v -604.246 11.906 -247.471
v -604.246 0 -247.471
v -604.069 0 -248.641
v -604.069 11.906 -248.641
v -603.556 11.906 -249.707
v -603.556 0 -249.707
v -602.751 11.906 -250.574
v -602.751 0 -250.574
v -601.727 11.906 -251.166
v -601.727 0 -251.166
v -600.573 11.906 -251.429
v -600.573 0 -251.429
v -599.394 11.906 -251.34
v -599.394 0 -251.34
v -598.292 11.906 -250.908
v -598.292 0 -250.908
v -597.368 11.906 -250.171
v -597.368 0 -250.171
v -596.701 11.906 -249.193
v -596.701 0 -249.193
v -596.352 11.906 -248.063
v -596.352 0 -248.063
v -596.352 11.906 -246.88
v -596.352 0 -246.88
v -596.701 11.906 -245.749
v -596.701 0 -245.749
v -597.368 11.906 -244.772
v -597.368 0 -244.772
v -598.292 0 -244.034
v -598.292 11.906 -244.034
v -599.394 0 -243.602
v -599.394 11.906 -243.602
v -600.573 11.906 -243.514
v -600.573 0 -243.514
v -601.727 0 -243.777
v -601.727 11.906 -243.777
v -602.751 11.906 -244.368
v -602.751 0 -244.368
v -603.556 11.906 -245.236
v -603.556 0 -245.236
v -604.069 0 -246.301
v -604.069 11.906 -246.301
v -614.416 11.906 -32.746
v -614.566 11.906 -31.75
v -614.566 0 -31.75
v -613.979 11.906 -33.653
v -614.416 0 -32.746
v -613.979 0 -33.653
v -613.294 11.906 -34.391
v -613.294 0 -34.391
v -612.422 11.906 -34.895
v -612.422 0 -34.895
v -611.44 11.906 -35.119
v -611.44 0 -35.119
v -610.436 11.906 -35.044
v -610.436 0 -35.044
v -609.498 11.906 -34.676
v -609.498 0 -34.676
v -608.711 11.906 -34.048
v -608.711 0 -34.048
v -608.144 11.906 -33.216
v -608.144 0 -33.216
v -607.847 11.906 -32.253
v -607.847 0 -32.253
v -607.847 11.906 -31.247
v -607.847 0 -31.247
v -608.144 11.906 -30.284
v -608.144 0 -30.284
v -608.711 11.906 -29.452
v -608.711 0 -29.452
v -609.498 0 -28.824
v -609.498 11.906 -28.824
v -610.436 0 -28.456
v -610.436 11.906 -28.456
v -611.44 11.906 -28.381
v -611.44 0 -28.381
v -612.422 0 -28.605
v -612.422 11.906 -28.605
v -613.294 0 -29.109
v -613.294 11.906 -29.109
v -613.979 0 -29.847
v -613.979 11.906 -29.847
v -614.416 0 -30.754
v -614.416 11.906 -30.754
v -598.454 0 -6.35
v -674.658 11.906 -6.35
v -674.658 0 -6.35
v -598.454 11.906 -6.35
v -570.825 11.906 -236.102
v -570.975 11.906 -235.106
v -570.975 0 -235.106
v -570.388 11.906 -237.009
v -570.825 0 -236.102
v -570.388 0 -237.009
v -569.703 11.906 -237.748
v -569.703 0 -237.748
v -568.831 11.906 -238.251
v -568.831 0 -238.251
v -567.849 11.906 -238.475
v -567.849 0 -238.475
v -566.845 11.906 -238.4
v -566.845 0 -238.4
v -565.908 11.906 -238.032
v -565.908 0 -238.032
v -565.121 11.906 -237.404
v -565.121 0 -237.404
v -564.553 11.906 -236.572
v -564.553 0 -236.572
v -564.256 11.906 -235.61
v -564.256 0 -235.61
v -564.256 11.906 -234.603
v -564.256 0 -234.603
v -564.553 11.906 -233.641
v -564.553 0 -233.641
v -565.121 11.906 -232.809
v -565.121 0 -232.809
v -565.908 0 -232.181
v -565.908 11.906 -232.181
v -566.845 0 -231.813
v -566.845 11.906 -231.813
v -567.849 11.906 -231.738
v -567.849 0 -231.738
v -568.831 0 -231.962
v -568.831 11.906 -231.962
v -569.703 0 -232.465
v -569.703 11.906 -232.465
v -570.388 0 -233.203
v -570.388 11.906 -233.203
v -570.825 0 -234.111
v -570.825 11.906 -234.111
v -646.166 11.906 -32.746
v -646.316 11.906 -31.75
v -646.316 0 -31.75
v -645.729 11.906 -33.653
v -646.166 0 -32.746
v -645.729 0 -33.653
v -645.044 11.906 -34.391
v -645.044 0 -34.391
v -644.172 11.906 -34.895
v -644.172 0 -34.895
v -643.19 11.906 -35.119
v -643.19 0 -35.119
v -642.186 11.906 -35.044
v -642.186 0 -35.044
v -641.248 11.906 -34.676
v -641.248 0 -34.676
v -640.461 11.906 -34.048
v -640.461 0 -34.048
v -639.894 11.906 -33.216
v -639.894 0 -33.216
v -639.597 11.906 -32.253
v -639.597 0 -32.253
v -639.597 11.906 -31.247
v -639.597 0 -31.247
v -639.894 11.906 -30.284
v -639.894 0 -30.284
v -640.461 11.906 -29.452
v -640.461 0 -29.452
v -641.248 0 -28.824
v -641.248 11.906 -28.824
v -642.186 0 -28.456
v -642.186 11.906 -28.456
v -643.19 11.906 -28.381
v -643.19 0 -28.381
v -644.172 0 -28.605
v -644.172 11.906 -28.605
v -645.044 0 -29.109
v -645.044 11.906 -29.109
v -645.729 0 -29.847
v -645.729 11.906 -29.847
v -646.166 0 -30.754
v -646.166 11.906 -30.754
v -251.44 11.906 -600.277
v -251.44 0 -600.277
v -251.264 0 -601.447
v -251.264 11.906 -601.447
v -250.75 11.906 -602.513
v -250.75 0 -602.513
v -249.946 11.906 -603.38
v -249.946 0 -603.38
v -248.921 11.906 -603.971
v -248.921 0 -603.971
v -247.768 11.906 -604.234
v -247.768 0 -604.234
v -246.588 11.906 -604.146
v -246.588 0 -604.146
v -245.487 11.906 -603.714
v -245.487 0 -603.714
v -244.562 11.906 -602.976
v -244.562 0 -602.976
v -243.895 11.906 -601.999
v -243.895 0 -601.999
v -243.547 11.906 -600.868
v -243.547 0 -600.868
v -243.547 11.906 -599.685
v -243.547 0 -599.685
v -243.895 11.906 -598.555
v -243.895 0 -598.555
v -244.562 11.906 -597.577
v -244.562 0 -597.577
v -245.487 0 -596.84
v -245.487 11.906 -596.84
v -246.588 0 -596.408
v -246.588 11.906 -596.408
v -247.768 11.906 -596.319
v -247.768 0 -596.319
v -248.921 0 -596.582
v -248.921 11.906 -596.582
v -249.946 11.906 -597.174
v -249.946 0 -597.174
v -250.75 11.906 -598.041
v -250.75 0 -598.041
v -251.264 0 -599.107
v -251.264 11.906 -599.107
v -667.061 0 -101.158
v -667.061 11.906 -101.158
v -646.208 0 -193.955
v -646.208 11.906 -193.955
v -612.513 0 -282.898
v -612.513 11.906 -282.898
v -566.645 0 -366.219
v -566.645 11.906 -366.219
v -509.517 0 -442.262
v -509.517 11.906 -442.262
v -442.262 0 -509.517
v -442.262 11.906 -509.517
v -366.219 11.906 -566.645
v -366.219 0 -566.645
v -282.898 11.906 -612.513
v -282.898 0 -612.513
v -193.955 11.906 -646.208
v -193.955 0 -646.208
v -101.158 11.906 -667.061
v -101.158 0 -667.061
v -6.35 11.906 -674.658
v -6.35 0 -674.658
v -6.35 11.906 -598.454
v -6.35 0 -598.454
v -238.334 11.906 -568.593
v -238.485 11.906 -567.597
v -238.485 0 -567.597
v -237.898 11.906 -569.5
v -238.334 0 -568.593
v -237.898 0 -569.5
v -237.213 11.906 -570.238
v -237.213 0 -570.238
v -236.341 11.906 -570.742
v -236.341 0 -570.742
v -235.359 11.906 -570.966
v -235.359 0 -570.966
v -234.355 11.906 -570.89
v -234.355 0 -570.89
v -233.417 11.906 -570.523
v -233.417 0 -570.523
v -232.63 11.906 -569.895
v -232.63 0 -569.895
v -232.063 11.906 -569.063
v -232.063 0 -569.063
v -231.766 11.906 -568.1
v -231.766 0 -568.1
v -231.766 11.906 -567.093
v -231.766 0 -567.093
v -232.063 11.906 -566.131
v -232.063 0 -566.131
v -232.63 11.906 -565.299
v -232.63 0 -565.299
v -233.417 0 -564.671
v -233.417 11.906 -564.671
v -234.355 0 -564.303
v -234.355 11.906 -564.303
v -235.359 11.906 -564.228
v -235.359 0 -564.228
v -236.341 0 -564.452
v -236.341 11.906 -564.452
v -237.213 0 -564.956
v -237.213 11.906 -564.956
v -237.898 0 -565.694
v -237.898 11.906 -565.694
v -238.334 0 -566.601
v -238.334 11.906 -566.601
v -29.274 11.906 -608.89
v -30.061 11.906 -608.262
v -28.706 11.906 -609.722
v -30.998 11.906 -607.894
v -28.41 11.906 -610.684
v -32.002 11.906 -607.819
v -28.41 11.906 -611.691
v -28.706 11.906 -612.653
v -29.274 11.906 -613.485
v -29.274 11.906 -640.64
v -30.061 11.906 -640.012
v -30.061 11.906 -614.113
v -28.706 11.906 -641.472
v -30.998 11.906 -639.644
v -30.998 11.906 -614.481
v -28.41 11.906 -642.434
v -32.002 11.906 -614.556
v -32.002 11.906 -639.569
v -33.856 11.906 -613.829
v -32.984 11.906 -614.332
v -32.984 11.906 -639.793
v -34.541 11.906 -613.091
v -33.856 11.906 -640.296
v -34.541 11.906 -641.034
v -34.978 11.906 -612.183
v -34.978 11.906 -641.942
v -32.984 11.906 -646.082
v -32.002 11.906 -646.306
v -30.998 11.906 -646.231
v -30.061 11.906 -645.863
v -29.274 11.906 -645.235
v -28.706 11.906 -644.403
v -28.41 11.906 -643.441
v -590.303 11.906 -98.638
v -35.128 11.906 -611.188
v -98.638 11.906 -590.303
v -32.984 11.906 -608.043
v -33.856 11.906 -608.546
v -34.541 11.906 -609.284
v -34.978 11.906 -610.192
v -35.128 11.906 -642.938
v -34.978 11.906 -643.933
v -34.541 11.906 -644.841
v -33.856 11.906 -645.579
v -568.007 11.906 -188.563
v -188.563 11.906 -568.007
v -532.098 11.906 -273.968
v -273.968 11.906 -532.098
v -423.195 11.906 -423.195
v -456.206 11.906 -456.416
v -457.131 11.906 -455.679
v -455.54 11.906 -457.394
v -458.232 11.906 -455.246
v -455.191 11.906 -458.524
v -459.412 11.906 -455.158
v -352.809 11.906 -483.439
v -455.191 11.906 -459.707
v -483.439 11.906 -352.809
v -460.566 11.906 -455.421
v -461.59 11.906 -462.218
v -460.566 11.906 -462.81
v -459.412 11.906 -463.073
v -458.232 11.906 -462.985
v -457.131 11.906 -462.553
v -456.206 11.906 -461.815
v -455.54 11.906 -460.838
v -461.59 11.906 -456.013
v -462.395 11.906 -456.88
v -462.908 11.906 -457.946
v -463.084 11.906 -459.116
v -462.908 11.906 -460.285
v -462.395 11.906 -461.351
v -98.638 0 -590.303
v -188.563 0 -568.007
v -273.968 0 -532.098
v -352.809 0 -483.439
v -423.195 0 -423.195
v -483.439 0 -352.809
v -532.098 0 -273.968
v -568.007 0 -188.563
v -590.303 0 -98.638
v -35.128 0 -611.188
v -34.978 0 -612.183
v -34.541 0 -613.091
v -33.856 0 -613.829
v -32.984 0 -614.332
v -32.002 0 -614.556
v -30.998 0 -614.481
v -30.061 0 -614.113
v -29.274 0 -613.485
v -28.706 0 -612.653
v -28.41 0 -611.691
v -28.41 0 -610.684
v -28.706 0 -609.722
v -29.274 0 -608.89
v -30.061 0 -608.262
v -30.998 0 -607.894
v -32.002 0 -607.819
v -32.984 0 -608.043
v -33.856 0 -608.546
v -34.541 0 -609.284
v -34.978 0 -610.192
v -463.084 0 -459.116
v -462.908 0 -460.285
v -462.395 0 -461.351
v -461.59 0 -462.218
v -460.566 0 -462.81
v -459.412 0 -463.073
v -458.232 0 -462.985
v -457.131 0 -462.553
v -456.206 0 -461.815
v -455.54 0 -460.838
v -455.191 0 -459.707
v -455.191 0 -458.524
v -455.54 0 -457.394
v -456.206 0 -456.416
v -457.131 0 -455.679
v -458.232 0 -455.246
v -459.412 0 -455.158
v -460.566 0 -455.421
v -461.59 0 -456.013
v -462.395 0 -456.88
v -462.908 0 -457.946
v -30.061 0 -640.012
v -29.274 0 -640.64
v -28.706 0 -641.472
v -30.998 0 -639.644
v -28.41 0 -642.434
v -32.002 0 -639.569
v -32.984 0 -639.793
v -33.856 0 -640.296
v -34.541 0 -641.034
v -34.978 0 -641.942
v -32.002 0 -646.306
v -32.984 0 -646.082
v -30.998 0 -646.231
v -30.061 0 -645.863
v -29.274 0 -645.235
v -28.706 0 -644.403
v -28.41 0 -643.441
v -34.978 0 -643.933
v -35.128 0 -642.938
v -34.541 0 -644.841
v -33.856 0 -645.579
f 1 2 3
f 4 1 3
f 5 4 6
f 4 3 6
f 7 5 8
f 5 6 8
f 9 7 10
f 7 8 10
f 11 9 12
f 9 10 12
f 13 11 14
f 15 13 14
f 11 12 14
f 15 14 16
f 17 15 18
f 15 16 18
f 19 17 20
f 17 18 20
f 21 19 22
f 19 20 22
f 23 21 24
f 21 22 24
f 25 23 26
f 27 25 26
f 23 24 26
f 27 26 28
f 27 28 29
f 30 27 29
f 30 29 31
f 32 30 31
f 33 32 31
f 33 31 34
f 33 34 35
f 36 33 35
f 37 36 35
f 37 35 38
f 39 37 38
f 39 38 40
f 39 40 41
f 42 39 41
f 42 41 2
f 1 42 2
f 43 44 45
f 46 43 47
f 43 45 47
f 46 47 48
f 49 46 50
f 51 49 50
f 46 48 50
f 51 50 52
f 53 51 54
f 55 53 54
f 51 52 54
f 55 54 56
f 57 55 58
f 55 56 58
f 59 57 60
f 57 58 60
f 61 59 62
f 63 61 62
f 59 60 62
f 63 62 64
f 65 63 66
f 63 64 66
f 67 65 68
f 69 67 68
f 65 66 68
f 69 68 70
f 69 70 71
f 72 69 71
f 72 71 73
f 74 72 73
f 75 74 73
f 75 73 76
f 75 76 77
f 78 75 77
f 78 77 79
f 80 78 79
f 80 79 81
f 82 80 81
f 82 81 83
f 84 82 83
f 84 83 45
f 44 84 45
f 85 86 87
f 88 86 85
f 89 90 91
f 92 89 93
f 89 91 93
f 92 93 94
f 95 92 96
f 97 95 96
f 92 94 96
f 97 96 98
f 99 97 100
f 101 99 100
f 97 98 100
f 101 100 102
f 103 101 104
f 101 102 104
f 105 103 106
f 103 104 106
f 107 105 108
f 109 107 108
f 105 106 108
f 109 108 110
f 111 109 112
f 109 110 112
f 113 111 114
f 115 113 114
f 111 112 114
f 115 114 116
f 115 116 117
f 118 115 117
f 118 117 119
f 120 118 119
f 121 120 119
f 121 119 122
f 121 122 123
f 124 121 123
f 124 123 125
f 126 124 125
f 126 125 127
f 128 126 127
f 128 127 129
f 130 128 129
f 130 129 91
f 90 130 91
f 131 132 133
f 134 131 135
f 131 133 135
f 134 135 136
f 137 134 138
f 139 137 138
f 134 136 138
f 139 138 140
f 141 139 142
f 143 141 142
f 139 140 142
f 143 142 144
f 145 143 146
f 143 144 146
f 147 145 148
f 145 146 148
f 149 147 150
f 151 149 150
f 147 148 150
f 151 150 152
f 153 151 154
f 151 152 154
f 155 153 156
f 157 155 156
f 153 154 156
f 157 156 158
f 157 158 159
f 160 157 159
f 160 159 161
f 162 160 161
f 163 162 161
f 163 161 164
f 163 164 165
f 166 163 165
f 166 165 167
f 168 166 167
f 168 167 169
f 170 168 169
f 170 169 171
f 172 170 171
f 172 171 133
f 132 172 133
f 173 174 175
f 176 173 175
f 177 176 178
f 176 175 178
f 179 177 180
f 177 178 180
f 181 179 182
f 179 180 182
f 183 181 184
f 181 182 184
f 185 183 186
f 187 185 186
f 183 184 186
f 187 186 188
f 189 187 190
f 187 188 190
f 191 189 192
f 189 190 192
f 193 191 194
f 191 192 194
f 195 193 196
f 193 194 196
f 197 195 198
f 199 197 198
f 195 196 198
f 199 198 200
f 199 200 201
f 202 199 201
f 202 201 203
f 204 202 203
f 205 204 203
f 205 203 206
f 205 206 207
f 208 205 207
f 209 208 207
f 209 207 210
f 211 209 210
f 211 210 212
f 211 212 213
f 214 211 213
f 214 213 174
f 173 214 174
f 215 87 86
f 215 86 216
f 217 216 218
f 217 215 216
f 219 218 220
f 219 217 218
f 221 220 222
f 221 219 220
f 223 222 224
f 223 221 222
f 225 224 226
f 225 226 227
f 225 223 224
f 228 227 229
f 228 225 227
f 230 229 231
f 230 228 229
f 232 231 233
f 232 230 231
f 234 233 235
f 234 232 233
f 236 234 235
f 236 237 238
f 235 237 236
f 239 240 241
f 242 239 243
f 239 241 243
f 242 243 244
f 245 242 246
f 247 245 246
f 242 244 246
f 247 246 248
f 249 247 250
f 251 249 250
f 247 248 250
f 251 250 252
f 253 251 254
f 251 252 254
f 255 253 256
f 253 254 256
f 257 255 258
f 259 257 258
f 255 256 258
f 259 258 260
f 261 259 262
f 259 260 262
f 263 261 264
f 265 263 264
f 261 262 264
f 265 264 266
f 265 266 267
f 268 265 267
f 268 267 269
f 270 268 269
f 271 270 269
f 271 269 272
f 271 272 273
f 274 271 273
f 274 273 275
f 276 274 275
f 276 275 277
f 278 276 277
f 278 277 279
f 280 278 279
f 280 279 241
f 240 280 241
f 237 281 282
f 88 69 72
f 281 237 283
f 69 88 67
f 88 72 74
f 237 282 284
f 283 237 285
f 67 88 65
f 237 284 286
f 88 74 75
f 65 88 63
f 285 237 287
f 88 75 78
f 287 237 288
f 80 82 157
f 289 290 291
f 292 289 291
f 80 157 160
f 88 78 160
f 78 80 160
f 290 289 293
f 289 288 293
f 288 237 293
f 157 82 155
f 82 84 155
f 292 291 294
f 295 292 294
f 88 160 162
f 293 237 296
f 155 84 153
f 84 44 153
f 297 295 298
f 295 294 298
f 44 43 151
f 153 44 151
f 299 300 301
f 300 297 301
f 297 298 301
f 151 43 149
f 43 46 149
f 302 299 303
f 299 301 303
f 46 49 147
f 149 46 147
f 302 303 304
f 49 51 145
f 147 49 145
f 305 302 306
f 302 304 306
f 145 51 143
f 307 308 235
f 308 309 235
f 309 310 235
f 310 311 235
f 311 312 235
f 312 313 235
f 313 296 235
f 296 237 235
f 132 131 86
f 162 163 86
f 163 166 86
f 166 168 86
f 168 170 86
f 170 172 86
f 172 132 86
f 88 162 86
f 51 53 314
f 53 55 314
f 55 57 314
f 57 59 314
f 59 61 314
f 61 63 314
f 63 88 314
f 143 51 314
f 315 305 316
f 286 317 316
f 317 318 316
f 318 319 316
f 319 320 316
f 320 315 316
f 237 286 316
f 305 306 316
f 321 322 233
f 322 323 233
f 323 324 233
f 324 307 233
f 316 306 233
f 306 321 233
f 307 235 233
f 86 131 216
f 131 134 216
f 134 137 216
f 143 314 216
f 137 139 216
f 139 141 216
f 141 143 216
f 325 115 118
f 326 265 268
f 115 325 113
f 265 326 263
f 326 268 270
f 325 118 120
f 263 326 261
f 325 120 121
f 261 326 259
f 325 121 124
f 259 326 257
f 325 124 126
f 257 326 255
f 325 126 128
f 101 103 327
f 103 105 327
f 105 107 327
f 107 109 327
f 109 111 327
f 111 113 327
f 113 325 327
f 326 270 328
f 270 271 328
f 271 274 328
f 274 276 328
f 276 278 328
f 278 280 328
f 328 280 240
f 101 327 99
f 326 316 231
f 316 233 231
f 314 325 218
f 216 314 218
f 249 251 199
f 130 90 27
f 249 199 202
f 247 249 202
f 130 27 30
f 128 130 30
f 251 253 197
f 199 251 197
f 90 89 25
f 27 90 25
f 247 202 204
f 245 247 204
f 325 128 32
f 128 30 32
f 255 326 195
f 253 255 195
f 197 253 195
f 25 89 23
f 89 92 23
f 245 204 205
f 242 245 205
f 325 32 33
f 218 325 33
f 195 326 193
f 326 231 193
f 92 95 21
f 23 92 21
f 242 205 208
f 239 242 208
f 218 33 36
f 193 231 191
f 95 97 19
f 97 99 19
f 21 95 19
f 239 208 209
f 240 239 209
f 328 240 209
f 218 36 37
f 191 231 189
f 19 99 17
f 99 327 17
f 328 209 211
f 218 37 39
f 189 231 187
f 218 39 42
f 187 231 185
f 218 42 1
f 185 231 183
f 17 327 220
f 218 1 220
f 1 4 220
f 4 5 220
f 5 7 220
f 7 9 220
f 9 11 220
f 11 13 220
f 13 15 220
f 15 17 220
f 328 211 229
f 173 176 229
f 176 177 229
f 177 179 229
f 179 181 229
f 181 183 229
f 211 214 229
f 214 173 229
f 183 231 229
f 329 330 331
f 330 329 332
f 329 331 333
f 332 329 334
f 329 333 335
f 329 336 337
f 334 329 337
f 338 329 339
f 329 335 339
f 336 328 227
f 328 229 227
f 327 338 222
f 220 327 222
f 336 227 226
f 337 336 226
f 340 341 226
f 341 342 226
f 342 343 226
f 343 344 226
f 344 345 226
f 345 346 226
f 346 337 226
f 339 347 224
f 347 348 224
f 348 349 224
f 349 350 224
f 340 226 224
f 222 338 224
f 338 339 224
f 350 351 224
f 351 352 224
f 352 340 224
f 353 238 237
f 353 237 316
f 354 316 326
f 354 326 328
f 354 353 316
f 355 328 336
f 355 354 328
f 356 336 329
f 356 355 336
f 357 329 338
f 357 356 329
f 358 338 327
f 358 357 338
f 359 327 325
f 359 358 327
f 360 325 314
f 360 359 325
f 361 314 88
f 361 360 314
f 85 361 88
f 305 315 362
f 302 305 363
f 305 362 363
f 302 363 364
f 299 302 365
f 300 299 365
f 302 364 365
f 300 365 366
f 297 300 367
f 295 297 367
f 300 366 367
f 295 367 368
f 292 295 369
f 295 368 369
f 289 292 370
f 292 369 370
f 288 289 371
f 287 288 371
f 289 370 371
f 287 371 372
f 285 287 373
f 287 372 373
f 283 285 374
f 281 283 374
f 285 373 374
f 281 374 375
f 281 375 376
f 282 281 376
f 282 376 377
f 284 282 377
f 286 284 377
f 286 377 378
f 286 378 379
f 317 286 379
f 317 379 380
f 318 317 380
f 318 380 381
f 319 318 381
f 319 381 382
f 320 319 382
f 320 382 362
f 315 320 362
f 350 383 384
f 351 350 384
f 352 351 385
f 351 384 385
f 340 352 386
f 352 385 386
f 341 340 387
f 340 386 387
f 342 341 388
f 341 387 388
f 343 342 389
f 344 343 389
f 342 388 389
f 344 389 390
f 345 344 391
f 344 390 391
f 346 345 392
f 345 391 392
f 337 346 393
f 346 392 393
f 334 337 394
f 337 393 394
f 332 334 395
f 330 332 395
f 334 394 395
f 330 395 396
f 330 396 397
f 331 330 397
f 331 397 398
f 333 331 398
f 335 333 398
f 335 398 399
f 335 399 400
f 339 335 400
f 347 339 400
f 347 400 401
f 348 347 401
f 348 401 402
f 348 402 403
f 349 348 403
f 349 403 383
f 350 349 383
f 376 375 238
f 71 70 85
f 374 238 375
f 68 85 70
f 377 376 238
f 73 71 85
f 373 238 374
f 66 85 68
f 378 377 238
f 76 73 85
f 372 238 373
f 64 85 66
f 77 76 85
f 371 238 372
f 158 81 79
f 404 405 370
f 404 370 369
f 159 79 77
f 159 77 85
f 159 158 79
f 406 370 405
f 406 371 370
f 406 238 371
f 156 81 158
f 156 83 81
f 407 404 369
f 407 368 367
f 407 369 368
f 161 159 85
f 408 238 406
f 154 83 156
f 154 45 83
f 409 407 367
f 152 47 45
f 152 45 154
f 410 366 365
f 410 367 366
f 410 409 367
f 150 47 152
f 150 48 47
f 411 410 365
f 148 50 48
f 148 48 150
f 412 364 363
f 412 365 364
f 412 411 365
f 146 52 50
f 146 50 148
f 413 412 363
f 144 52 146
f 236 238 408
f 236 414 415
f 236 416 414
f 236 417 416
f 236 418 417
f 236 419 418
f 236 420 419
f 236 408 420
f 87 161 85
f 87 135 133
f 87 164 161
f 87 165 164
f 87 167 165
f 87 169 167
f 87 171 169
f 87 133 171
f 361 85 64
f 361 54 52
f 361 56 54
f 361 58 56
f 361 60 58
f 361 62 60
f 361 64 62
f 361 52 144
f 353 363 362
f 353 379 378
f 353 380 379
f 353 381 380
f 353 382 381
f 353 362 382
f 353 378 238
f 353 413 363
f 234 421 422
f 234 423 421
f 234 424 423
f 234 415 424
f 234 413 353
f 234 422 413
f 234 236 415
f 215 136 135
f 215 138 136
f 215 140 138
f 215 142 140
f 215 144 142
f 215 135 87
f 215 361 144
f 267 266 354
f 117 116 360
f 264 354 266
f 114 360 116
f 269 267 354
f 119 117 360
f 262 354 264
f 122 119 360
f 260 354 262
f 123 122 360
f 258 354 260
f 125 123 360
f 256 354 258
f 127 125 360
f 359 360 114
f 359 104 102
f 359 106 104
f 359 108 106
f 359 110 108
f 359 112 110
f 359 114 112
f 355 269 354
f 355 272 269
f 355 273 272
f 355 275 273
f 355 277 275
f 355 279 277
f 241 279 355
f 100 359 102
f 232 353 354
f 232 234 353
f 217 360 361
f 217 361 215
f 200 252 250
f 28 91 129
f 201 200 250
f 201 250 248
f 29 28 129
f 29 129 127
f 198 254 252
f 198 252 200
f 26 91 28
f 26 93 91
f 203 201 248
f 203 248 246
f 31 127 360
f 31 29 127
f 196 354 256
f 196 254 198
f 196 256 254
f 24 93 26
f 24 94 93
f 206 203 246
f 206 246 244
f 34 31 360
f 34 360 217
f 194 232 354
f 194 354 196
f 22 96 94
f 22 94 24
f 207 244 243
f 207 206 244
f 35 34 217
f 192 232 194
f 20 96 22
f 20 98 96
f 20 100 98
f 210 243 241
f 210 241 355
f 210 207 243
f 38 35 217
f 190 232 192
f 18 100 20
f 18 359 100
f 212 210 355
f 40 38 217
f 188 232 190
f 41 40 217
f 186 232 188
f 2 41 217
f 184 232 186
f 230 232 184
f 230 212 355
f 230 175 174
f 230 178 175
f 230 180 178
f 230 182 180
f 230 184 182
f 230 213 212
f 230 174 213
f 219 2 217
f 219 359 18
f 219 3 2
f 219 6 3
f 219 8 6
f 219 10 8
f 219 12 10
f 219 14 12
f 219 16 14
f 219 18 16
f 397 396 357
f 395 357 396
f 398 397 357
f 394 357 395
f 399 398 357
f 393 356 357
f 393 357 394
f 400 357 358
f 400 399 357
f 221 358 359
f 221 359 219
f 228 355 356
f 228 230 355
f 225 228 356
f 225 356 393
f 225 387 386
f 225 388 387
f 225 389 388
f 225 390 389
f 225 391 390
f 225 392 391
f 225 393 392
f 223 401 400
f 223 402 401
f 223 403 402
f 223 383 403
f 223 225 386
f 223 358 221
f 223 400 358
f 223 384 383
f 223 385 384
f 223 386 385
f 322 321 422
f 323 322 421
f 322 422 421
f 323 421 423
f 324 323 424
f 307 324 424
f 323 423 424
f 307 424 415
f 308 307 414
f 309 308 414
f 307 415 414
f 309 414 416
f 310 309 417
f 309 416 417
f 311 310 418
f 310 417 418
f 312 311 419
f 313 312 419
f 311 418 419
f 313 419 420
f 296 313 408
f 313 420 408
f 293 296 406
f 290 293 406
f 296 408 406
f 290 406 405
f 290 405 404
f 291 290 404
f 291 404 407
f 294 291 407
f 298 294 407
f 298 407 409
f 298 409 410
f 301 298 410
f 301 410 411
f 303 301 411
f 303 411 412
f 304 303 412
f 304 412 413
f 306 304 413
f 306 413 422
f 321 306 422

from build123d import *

# Parameters (mm, degrees)
BOSS_EXTRUDE1_DEPTH            = 11.90625
SKETCH2_W                      = 12.7
SKETCH2_H                      = 38.133687951
SKETCH2_W_2                    = 38.133687951
SKETCH2_H_2                    = 12.7
CUT_EXTRUDE1_DEPTH             = 955.226495179
F_1_4_CLEARANCE_HOLE2_D        = 6.7564
SKETCH8_W                      = 674.6875
SKETCH8_H                      = 674.6875
CUT_EXTRUDE4_DEPTH             = 955.226495179
F_5_16_0_3125_DIAMETER_HOLE1_D = 7.9375
SKETCH14_W                     = 6.35
SKETCH14_H                     = 76.233687951
SKETCH14_W_2                   = 76.233687951
SKETCH14_H_2                   = 6.35
CUT_EXTRUDE7_DEPTH             = 955.226495179


with BuildPart() as part:
    # Sketch1 → Boss-Extrude1 (new body)
    with BuildSketch(Plane(origin=(0, 0, 0), x_dir=(1, 0, 0), z_dir=(0, 1, 0))):
        with BuildLine():
            Line((-598.4875, 0), (-674.6875, 0))
            ThreePointArc((-674.6875, 0), (0, 674.6875), (674.6875, 0))
            Line((674.6875, 0), (598.4875, 0))
            ThreePointArc((598.4875, 0), (0, 598.4875), (-598.4875, 0))
        make_face()
    extrude(amount=BOSS_EXTRUDE1_DEPTH)

    # Sketch2 → Cut-Extrude1 (cut, through all)
    with BuildSketch(Plane(origin=(0, 11.90625, 0), x_dir=(1, 0, 0), z_dir=(0, 1, 0))):
        with Locations((0, 617.520656025)):
            Rectangle(SKETCH2_W, SKETCH2_H)
        with Locations((617.520656025, 0)):
            Rectangle(SKETCH2_W_2, SKETCH2_H_2)
        with Locations((0, -617.520656025)):
            Rectangle(SKETCH2_W, SKETCH2_H)
        with Locations((-617.520656025, 0)):
            Rectangle(SKETCH2_W_2, SKETCH2_H_2)
    extrude(amount=-CUT_EXTRUDE1_DEPTH, mode=Mode.SUBTRACT)

    # 1/4 Clearance Hole2 (through all)
    with Locations(Plane(origin=(0, 11.90625, 0), x_dir=(1, 0, 0), z_dir=(0, 1, 0))):
        with Locations((-31.75, 642.9375), (-31.75, 611.1875), (-611.1875, 31.75), (-642.9375, 31.75), (-567.596939292, 235.106350216), (-235.106350216, 567.596939292)):
            Hole(F_1_4_CLEARANCE_HOLE2_D / 2)

    # Sketch8 → Cut-Extrude4 (cut, through all)
    with BuildSketch(Plane(origin=(0, 11.90625, 0), x_dir=(1, 0, 0), z_dir=(0, 1, 0))):
        with Locations((337.34375, 337.34375)):
            Rectangle(SKETCH8_W, SKETCH8_H)
    extrude(amount=-CUT_EXTRUDE4_DEPTH, mode=Mode.SUBTRACT)

    # 5/16 (0.3125) Diameter Hole1 (through all)
    with Locations(Plane(origin=(0, 11.90625, 0), x_dir=(1, 0, 0), z_dir=(0, 1, 0))):
        with Locations((-247.471182654, 600.276828982), (-459.11559419, 459.11559419), (-600.276828982, 247.471182654)):
            Hole(F_5_16_0_3125_DIAMETER_HOLE1_D / 2)

    # Sketch14 → Cut-Extrude7 (cut, through all)
    with BuildSketch(Plane(origin=(0, 11.90625, 0), x_dir=(1, 0, 0), z_dir=(0, 1, 0))):
        with Locations((-3.175, 636.570656025)):
            Rectangle(SKETCH14_W, SKETCH14_H)
        with Locations((-636.570656025, 3.175)):
            Rectangle(SKETCH14_W_2, SKETCH14_H_2)
    extrude(amount=-CUT_EXTRUDE7_DEPTH, mode=Mode.SUBTRACT)


solid = part.part
